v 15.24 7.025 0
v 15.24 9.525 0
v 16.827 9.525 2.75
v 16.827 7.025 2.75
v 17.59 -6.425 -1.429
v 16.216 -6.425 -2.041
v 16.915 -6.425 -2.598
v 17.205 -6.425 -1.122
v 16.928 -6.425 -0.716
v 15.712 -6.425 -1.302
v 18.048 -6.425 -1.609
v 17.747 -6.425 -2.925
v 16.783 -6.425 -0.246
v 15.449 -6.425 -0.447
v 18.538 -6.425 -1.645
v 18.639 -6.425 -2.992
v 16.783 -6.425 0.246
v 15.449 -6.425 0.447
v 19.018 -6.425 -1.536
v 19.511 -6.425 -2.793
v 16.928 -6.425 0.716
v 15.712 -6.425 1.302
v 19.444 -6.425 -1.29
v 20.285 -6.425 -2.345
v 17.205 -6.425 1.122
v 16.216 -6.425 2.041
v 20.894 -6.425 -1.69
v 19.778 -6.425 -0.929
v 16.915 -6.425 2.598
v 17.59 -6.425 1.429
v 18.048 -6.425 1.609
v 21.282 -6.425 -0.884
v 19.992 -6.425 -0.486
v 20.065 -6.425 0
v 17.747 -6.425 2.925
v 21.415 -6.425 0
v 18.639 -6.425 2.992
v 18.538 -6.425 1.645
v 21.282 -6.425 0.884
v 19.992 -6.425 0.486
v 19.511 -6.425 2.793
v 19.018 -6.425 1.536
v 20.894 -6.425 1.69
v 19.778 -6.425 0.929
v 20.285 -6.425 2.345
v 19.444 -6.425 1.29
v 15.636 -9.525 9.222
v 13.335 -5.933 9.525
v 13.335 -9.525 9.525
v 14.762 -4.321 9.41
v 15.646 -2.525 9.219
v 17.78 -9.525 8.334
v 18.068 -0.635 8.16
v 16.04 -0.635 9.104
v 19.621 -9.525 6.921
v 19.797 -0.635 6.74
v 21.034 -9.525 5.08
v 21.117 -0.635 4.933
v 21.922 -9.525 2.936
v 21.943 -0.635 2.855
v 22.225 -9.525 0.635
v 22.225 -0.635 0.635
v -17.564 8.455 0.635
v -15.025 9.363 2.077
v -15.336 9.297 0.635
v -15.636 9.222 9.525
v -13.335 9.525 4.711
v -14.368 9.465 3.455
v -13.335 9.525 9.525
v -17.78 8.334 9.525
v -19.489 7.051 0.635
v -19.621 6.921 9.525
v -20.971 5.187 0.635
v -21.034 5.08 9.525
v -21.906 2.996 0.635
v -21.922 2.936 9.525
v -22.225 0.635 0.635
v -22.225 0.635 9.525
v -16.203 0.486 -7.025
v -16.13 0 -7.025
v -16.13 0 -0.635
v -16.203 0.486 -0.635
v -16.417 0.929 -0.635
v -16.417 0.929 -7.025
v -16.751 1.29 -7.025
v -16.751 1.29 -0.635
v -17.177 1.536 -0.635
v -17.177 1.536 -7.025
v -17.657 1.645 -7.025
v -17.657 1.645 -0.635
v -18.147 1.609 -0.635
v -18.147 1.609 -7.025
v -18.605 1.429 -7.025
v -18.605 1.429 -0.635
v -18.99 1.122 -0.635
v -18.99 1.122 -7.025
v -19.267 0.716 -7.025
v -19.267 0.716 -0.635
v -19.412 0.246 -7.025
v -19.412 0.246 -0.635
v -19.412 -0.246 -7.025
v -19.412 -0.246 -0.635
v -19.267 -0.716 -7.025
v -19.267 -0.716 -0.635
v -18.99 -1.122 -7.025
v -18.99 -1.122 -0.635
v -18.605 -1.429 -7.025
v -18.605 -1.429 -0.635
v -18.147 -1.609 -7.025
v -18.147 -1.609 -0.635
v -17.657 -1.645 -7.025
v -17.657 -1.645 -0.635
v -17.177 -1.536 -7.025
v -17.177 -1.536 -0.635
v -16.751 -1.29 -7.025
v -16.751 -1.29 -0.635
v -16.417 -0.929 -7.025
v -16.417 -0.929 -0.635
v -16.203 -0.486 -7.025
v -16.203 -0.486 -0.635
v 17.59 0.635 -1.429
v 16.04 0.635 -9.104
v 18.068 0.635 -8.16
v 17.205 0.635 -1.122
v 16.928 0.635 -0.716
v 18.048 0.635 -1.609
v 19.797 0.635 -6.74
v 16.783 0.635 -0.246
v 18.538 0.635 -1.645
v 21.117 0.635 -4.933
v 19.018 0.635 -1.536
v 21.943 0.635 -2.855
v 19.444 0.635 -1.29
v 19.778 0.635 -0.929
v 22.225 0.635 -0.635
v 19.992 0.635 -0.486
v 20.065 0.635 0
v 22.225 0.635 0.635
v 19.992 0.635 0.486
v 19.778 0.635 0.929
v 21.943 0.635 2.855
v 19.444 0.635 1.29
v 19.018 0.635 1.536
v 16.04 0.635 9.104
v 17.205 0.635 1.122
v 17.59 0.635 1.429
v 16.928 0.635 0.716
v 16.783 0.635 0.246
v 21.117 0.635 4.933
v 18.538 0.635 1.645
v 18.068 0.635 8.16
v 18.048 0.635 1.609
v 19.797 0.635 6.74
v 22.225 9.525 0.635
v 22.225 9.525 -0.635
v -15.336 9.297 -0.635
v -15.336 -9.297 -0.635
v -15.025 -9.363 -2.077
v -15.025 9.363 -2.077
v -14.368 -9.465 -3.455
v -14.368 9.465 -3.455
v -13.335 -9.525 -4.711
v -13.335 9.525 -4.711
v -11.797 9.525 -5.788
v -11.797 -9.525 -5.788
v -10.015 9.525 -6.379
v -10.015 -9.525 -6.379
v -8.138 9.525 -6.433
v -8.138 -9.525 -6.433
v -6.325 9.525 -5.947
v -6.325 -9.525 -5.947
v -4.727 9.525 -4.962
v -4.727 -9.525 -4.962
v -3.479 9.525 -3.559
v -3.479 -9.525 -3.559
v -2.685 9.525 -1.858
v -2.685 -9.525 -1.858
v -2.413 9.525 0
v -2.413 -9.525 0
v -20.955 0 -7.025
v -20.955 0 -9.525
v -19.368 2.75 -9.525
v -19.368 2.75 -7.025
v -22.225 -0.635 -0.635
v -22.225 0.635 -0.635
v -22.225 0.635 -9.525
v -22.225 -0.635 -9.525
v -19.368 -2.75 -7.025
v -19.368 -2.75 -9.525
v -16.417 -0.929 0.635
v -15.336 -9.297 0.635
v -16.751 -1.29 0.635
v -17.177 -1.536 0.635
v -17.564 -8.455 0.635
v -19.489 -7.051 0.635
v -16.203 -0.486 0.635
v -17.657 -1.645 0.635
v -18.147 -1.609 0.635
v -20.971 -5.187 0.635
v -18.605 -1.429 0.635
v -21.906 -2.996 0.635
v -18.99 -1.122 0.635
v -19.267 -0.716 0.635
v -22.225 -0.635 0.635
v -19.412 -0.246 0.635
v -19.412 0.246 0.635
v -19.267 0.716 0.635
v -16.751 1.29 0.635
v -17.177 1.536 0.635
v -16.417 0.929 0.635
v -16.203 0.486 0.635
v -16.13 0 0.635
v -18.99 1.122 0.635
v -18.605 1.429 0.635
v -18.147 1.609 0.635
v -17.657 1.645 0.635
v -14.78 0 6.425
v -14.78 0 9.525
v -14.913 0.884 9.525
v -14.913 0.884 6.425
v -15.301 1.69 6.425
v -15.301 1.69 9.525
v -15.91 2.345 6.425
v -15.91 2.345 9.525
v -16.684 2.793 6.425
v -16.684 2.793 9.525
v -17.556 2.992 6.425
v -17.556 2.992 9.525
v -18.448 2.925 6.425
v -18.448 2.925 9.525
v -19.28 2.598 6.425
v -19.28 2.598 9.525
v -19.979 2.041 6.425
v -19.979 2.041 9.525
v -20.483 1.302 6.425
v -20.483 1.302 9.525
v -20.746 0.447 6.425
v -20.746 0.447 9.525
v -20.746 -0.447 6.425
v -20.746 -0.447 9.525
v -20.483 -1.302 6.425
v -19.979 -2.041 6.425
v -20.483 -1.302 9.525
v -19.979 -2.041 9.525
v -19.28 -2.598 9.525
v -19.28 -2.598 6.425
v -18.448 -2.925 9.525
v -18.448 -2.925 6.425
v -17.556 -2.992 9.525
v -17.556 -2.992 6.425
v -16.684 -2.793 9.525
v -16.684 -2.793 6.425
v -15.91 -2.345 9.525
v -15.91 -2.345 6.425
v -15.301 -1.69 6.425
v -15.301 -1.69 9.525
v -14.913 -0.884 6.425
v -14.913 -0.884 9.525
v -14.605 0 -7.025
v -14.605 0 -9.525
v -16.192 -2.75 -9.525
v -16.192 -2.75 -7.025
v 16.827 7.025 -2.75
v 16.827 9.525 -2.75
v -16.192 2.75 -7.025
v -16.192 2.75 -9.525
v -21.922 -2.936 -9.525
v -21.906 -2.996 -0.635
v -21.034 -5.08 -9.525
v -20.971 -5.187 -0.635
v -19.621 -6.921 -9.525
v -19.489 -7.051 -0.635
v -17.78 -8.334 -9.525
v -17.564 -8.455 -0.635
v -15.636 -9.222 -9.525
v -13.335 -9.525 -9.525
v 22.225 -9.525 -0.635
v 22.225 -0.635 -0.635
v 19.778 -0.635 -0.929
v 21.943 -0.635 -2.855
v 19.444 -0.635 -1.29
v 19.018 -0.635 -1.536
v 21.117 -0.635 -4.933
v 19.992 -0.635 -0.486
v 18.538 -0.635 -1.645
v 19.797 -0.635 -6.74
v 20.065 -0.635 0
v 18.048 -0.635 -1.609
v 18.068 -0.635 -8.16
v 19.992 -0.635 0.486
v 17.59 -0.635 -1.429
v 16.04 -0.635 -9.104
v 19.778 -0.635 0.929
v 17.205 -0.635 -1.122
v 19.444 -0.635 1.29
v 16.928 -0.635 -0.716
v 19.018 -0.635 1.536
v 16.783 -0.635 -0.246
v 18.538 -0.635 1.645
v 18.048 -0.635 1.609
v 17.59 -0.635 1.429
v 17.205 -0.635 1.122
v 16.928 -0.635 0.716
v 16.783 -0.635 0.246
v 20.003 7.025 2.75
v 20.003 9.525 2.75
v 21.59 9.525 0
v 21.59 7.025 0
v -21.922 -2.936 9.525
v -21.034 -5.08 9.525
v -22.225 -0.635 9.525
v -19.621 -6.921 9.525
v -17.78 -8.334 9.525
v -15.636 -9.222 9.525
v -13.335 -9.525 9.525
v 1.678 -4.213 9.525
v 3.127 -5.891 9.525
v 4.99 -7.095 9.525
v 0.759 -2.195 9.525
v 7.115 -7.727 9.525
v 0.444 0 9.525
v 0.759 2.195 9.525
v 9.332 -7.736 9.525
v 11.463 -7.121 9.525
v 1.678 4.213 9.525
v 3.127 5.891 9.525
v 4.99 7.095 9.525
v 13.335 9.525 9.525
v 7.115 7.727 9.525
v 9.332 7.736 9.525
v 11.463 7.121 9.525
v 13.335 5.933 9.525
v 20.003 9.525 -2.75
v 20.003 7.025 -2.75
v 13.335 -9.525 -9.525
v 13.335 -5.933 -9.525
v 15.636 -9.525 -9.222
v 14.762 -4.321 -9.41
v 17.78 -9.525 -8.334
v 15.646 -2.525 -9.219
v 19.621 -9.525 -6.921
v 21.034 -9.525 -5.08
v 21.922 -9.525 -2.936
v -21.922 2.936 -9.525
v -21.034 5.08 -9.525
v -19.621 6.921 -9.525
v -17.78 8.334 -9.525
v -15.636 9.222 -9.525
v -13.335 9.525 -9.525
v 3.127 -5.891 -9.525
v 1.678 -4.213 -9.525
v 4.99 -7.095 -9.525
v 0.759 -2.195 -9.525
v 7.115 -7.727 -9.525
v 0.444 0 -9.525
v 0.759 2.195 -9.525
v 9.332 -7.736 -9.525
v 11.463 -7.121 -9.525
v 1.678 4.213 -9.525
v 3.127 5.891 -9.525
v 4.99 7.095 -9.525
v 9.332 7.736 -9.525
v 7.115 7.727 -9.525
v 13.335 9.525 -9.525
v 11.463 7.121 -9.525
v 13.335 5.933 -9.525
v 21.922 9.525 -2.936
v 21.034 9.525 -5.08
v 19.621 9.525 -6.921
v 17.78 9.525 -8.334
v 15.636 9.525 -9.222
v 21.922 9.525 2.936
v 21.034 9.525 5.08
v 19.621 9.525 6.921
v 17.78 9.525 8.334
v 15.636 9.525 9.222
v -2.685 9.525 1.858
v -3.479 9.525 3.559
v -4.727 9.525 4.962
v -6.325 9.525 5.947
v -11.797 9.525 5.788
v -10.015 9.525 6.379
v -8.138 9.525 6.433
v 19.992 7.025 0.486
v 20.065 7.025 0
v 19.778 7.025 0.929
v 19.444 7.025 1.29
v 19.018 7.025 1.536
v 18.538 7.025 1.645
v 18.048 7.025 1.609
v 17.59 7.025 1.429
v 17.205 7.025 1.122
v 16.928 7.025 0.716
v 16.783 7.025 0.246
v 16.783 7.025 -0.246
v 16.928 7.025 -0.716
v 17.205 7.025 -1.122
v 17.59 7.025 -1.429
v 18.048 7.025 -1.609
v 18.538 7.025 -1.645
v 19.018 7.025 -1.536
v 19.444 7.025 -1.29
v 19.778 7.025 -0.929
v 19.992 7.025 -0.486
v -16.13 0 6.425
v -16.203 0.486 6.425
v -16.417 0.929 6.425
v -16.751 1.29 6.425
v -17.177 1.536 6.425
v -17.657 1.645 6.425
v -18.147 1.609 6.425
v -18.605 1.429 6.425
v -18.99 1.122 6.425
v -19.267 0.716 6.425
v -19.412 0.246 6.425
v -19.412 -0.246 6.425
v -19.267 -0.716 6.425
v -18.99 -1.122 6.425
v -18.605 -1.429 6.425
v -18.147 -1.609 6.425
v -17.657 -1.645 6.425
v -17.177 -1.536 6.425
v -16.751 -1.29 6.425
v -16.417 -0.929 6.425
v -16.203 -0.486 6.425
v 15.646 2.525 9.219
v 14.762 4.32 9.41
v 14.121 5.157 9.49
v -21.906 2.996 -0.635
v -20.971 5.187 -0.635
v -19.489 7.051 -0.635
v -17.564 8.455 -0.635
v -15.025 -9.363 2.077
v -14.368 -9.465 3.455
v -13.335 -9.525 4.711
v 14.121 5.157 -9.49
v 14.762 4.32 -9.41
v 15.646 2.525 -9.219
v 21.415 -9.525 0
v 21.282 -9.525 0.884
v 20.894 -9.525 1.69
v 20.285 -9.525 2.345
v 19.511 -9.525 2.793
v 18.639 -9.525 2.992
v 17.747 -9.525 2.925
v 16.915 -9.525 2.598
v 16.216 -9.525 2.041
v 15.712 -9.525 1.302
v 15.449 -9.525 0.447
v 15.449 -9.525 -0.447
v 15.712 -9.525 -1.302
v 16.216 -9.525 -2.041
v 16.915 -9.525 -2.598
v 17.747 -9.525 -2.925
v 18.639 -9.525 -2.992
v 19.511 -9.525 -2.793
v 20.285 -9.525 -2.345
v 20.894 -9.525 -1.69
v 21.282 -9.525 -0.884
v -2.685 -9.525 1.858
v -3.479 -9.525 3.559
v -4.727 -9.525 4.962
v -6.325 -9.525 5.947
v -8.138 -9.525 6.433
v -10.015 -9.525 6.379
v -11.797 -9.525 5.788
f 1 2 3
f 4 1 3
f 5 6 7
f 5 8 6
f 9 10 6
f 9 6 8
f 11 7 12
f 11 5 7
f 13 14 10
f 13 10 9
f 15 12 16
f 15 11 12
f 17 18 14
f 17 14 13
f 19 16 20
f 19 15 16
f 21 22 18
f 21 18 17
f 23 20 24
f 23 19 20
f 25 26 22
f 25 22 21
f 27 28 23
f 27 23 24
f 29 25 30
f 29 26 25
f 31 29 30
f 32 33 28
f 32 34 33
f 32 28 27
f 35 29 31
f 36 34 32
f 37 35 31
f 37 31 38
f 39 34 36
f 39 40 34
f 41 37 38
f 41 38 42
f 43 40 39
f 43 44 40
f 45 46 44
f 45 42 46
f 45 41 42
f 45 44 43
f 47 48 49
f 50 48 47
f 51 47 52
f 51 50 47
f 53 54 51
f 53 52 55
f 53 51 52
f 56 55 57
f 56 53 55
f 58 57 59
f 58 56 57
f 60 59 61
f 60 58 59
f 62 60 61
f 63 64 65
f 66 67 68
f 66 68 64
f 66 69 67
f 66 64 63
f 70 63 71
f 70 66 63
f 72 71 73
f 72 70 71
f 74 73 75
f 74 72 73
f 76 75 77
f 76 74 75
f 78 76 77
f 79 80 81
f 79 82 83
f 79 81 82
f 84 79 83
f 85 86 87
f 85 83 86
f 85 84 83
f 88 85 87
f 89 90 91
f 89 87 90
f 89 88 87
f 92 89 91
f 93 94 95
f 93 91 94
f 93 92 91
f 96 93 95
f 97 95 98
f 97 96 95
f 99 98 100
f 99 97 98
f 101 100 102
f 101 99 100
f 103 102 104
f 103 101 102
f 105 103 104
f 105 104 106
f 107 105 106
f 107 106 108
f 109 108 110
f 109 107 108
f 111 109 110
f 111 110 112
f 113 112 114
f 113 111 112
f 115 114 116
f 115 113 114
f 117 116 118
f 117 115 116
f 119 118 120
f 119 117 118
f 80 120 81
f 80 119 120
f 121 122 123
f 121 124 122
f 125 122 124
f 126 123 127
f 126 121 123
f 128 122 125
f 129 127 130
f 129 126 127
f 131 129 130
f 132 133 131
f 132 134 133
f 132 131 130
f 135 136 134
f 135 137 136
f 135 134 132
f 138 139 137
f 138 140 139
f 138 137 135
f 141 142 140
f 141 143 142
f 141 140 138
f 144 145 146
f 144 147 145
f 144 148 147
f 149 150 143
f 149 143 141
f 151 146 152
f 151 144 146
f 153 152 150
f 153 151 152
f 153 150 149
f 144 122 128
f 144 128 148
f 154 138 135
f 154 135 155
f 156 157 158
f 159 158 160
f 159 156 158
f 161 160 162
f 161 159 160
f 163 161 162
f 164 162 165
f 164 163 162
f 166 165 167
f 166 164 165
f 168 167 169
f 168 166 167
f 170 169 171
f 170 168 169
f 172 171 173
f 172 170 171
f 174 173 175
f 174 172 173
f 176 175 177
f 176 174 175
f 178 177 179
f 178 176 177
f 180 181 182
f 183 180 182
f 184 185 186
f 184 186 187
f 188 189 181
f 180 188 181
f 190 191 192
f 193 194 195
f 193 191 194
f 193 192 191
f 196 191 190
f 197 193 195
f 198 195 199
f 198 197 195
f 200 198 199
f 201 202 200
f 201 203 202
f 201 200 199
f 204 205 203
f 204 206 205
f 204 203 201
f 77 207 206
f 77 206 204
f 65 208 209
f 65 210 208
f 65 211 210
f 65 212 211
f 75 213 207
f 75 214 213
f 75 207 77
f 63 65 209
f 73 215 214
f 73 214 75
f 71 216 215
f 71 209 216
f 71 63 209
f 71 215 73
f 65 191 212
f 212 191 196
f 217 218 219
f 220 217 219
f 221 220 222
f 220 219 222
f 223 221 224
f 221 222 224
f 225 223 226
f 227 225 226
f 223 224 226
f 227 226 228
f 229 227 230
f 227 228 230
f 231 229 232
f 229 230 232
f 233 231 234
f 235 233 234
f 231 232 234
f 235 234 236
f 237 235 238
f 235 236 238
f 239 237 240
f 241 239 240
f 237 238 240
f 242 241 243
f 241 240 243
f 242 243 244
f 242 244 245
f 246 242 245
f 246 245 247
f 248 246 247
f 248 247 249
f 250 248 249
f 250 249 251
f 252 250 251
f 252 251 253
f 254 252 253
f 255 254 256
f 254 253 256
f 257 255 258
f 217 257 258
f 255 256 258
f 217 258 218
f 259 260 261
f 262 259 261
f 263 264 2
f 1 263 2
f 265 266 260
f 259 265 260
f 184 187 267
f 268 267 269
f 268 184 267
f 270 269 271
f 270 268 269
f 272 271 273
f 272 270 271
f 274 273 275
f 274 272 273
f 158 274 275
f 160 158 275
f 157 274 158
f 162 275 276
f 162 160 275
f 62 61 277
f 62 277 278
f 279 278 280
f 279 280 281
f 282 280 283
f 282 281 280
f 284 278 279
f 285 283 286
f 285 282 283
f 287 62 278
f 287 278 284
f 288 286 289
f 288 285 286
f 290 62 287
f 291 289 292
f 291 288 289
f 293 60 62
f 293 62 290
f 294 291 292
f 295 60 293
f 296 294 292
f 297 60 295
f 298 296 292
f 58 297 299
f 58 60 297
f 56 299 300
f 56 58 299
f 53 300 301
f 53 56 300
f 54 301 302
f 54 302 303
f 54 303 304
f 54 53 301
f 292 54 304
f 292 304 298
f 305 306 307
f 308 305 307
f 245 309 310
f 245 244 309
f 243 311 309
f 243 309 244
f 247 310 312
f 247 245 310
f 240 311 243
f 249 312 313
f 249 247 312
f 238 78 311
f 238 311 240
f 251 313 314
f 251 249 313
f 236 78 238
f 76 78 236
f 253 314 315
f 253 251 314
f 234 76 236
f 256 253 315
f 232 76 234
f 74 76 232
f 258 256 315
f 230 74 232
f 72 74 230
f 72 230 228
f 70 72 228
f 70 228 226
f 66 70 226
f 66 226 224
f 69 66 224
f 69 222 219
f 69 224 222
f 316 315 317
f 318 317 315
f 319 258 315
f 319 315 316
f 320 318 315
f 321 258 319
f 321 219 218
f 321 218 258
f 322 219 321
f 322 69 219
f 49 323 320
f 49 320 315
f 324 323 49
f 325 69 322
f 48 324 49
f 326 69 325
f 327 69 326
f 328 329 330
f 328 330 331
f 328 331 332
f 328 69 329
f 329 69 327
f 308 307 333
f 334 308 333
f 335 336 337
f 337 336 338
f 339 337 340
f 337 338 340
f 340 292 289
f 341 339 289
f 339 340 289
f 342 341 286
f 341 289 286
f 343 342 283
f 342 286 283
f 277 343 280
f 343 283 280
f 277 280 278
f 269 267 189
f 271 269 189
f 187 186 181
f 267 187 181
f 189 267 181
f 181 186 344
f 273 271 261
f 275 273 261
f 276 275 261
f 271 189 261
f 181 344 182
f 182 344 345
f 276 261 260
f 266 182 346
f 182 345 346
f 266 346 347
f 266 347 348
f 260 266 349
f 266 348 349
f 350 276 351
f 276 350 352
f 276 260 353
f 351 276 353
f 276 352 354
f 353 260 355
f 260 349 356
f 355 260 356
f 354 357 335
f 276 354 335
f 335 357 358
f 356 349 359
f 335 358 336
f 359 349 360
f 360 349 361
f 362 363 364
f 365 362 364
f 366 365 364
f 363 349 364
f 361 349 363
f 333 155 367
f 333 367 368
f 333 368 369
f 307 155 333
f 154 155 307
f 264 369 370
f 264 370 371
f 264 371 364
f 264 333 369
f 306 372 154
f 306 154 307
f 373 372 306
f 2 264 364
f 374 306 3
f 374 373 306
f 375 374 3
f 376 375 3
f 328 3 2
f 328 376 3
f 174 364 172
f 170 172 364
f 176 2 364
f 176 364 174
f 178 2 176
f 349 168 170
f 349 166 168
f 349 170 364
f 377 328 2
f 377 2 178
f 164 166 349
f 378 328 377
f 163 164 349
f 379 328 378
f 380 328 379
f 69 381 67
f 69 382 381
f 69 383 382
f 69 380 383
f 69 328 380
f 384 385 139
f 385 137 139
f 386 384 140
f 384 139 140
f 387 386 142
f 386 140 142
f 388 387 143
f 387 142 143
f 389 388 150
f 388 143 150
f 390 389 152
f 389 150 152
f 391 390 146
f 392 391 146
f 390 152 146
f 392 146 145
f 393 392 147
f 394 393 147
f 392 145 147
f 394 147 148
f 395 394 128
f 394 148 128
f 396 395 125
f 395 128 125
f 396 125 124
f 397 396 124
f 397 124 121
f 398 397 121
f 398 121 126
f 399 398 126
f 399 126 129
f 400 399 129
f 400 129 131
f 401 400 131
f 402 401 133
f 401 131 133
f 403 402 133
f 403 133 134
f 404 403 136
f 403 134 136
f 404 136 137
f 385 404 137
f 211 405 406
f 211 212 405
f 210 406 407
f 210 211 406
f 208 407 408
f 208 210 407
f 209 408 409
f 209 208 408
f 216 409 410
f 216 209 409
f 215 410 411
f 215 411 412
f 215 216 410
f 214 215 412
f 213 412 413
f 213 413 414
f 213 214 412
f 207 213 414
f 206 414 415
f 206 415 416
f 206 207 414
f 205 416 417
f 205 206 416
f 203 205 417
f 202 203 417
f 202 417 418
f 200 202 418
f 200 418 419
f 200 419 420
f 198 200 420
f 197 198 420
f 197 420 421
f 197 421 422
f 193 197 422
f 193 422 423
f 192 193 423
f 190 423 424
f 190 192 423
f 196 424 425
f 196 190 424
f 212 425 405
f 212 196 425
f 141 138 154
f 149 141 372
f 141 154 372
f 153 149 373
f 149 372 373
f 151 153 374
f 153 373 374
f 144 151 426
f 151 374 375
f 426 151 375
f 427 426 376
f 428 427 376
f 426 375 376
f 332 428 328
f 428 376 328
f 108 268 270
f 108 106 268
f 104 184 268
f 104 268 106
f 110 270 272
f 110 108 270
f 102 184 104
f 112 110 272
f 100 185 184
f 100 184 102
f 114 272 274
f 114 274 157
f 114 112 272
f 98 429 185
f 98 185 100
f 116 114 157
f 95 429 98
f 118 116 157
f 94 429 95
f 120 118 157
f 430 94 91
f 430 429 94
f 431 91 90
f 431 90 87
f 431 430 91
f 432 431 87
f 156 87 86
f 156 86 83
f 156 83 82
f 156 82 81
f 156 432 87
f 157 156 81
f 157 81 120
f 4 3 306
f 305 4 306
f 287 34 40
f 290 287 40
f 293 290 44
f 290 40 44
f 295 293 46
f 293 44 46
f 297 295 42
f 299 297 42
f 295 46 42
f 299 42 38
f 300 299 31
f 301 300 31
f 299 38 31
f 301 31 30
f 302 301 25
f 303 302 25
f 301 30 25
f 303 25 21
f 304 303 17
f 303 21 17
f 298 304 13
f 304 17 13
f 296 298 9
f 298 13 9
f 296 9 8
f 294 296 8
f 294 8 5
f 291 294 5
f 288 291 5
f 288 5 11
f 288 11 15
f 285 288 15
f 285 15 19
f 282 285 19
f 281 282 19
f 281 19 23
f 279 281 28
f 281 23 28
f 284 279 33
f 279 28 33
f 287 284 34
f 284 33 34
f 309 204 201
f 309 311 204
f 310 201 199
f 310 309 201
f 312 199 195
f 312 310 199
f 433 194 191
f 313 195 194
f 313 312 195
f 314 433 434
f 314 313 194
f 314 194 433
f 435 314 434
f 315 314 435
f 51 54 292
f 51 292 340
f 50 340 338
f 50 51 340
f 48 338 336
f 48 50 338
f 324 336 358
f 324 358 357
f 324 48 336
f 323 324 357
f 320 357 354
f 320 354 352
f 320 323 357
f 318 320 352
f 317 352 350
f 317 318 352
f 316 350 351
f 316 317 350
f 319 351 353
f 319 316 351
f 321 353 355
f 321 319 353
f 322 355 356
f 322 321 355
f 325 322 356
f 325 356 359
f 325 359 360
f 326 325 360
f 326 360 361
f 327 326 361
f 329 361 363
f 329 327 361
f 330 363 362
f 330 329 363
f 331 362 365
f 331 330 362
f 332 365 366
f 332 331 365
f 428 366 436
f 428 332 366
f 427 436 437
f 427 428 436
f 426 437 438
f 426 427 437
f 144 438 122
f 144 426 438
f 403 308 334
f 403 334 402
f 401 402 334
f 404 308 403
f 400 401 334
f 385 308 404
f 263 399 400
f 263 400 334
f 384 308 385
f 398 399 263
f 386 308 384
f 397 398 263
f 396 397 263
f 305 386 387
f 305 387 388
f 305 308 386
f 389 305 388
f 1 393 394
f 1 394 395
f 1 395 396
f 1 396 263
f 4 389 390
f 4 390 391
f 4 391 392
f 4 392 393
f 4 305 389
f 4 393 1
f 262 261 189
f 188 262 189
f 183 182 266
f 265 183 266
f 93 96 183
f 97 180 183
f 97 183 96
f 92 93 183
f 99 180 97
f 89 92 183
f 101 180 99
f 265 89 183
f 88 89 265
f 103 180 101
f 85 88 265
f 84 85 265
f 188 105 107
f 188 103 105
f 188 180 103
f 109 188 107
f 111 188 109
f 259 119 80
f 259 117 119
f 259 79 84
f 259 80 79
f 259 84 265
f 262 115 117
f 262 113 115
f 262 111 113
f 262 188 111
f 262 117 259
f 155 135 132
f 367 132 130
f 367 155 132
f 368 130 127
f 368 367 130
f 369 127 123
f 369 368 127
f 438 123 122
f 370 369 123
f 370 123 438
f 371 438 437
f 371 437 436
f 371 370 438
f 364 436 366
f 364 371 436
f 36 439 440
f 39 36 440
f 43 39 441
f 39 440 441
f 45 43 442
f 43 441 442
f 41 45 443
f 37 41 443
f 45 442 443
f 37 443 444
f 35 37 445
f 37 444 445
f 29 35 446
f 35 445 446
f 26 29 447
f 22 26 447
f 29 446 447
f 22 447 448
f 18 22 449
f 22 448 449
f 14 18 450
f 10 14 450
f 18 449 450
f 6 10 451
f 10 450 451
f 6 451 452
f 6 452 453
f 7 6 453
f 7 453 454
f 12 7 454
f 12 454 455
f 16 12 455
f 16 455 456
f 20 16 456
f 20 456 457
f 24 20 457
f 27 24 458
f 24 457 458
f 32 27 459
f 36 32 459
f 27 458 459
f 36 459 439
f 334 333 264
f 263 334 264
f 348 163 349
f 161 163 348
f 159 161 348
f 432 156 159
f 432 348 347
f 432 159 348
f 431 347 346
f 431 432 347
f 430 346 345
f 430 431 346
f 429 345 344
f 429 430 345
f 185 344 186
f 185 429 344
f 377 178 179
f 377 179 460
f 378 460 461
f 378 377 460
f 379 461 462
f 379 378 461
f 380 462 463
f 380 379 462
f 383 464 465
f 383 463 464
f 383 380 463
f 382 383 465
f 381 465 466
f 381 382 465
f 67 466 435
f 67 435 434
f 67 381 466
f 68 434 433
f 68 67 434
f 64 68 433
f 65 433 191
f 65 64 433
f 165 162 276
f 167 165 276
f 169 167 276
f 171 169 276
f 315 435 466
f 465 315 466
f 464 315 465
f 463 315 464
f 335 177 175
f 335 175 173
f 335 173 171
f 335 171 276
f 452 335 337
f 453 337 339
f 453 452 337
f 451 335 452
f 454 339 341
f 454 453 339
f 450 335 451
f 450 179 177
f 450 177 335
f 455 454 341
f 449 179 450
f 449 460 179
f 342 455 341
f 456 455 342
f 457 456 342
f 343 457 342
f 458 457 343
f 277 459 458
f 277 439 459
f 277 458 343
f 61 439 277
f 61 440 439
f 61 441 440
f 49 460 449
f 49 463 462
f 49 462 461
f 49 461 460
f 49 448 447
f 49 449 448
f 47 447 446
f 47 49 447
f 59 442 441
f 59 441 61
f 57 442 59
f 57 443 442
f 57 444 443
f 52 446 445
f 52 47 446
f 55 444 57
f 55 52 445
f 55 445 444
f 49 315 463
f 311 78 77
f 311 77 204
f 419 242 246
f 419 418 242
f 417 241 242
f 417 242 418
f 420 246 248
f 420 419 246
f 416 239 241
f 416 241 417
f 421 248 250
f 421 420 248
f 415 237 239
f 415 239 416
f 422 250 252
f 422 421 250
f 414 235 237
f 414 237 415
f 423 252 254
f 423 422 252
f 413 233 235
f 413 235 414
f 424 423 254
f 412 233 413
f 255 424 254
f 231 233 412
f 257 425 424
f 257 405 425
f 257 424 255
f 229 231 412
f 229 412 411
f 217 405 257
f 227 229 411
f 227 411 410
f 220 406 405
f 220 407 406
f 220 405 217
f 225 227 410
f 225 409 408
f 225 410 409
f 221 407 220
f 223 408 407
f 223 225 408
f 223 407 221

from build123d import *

# Parameters (mm, degrees)
F0_R      = 1.65
F1_DEPTH  = 9.525
F2_R      = 1.65
F3_DEPTH  = 25.4
F4_R      = 3
F4_R_2    = 1.65
F5_DEPTH  = 3.1
F6_R      = 3
F6_R_2    = 1.65
F7_DEPTH  = 3.1
F8_R      = 1.65
F9_DEPTH  = 2.5
F10_R     = 1.65
F11_DEPTH = 2.5
F12_R     = 8.89


with BuildPart() as f1:
    # F0 (on Top) → F1 (new body, symmetric)
    with BuildSketch(Plane.XY):
        with BuildLine():
            Line((22.225, 9.525), (-22.225, 9.525))
            Line((-22.225, 9.525), (-22.225, -9.525))
            Line((-22.225, -9.525), (22.225, -9.525))
            Line((22.225, -9.525), (22.225, -0.635))
            Line((22.225, -0.635), (16.039644, -0.635))
            ThreePointArc((16.039644, -0.635), (0.4445, 0), (16.039644, 0.635))
            Line((16.039644, 0.635), (22.225, 0.635))
            Line((22.225, 0.635), (22.225, 9.525))
        make_face()
        with Locations((-17.78, 0)):
            Circle(F0_R, mode=Mode.SUBTRACT)
    extrude(amount=F1_DEPTH, both=True)

    # F2 (on Front) → F3 (cut, symmetric)
    with BuildSketch(Plane.XZ):
        with BuildLine():
            ThreePointArc((-15.335797, -0.635), (-15.367, 0), (-15.335797, 0.635))
            Line((-15.335797, 0.635), (-22.225, 0.635))
            Line((-22.225, 0.635), (-22.225, -0.635))
            Line((-22.225, -0.635), (-15.335797, -0.635))
        make_face()
        with BuildLine():
            Line((-8.89, 0.635), (-15.335797, 0.635))
            ThreePointArc((-15.335797, 0.635), (-15.367, 0), (-15.335797, -0.635))
            Line((-15.335797, -0.635), (-8.89, -0.635))
            Line((-8.89, -0.635), (-8.89, 0.635))
        make_face()
        with BuildLine():
            ThreePointArc((-15.335797, -0.635), (-8.572117, -6.469195), (-2.413, 0))
            ThreePointArc((-2.413, 0), (-8.572117, 6.469195), (-15.335797, 0.635))
            Line((-15.335797, 0.635), (-8.89, 0.635))
            Line((-8.89, 0.635), (-8.89, -0.635))
            Line((-8.89, -0.635), (-15.335797, -0.635))
        make_face()
        with Locations((18.415, 0)):
            Circle(F2_R)
    extrude(amount=F3_DEPTH, both=True, mode=Mode.SUBTRACT)

    # F4 (on face) → F5 (cut)
    with BuildSketch(Plane.XZ.offset(9.525)):
        with Locations((18.415, 0)):
            Circle(F4_R)
        with Locations((18.415, 0)):
            Circle(F4_R_2, mode=Mode.SUBTRACT)
    extrude(amount=-F5_DEPTH, mode=Mode.SUBTRACT)

    # F6 (on face) → F7 (cut)
    with BuildSketch(Plane.XY.offset(9.525)):
        with Locations((-17.78, 0)):
            Circle(F6_R)
        with Locations((-17.78, 0)):
            Circle(F6_R_2, mode=Mode.SUBTRACT)
    extrude(amount=-F7_DEPTH, mode=Mode.SUBTRACT)

    # F8 (on face) → F9 (cut)
    with BuildSketch(Plane(origin=(0, 9.525, 0), x_dir=(-1, 0, 0), z_dir=(0, 1, 0))):
        Polygon((-16.827287, 2.75), (-20.002713, 2.75), (-21.590426, 0), (-20.002713, -2.75), (-16.827287, -2.75), (-15.239574, 0), align=None)
        with Locations((-18.415, 0)):
            Circle(F8_R, mode=Mode.SUBTRACT)
    extrude(amount=-F9_DEPTH, mode=Mode.SUBTRACT)

    # F10 (on face) → F11 (cut)
    with BuildSketch(Plane(origin=(0, 0, -9.525), x_dir=(1, 0, 0), z_dir=(0, 0, -1))):
        Polygon((-16.192287, 2.75), (-19.367713, 2.75), (-20.955426, 0), (-19.367713, -2.75), (-16.192287, -2.75), (-14.604574, 0), align=None)
        with Locations((-17.78, 0)):
            Circle(F10_R, mode=Mode.SUBTRACT)
    extrude(amount=-F11_DEPTH, mode=Mode.SUBTRACT)

    # F12
    f12_edges = [f1.edges().sort_by_distance(p)[0] for p in [
        (22.225, -5.08, 9.525),
        (22.225, 5.08, 9.525),
        (22.225, -5.08, -9.525),
        (22.225, 5.08, -9.525),
        (-22.225, -9.525, -5.08),
        (-22.225, -9.525, 5.08),
        (-22.225, 9.525, -5.08),
        (-22.225, 9.525, 5.08),
    ]]
    fillet(f12_edges, radius=F12_R)


solid = f1.part
